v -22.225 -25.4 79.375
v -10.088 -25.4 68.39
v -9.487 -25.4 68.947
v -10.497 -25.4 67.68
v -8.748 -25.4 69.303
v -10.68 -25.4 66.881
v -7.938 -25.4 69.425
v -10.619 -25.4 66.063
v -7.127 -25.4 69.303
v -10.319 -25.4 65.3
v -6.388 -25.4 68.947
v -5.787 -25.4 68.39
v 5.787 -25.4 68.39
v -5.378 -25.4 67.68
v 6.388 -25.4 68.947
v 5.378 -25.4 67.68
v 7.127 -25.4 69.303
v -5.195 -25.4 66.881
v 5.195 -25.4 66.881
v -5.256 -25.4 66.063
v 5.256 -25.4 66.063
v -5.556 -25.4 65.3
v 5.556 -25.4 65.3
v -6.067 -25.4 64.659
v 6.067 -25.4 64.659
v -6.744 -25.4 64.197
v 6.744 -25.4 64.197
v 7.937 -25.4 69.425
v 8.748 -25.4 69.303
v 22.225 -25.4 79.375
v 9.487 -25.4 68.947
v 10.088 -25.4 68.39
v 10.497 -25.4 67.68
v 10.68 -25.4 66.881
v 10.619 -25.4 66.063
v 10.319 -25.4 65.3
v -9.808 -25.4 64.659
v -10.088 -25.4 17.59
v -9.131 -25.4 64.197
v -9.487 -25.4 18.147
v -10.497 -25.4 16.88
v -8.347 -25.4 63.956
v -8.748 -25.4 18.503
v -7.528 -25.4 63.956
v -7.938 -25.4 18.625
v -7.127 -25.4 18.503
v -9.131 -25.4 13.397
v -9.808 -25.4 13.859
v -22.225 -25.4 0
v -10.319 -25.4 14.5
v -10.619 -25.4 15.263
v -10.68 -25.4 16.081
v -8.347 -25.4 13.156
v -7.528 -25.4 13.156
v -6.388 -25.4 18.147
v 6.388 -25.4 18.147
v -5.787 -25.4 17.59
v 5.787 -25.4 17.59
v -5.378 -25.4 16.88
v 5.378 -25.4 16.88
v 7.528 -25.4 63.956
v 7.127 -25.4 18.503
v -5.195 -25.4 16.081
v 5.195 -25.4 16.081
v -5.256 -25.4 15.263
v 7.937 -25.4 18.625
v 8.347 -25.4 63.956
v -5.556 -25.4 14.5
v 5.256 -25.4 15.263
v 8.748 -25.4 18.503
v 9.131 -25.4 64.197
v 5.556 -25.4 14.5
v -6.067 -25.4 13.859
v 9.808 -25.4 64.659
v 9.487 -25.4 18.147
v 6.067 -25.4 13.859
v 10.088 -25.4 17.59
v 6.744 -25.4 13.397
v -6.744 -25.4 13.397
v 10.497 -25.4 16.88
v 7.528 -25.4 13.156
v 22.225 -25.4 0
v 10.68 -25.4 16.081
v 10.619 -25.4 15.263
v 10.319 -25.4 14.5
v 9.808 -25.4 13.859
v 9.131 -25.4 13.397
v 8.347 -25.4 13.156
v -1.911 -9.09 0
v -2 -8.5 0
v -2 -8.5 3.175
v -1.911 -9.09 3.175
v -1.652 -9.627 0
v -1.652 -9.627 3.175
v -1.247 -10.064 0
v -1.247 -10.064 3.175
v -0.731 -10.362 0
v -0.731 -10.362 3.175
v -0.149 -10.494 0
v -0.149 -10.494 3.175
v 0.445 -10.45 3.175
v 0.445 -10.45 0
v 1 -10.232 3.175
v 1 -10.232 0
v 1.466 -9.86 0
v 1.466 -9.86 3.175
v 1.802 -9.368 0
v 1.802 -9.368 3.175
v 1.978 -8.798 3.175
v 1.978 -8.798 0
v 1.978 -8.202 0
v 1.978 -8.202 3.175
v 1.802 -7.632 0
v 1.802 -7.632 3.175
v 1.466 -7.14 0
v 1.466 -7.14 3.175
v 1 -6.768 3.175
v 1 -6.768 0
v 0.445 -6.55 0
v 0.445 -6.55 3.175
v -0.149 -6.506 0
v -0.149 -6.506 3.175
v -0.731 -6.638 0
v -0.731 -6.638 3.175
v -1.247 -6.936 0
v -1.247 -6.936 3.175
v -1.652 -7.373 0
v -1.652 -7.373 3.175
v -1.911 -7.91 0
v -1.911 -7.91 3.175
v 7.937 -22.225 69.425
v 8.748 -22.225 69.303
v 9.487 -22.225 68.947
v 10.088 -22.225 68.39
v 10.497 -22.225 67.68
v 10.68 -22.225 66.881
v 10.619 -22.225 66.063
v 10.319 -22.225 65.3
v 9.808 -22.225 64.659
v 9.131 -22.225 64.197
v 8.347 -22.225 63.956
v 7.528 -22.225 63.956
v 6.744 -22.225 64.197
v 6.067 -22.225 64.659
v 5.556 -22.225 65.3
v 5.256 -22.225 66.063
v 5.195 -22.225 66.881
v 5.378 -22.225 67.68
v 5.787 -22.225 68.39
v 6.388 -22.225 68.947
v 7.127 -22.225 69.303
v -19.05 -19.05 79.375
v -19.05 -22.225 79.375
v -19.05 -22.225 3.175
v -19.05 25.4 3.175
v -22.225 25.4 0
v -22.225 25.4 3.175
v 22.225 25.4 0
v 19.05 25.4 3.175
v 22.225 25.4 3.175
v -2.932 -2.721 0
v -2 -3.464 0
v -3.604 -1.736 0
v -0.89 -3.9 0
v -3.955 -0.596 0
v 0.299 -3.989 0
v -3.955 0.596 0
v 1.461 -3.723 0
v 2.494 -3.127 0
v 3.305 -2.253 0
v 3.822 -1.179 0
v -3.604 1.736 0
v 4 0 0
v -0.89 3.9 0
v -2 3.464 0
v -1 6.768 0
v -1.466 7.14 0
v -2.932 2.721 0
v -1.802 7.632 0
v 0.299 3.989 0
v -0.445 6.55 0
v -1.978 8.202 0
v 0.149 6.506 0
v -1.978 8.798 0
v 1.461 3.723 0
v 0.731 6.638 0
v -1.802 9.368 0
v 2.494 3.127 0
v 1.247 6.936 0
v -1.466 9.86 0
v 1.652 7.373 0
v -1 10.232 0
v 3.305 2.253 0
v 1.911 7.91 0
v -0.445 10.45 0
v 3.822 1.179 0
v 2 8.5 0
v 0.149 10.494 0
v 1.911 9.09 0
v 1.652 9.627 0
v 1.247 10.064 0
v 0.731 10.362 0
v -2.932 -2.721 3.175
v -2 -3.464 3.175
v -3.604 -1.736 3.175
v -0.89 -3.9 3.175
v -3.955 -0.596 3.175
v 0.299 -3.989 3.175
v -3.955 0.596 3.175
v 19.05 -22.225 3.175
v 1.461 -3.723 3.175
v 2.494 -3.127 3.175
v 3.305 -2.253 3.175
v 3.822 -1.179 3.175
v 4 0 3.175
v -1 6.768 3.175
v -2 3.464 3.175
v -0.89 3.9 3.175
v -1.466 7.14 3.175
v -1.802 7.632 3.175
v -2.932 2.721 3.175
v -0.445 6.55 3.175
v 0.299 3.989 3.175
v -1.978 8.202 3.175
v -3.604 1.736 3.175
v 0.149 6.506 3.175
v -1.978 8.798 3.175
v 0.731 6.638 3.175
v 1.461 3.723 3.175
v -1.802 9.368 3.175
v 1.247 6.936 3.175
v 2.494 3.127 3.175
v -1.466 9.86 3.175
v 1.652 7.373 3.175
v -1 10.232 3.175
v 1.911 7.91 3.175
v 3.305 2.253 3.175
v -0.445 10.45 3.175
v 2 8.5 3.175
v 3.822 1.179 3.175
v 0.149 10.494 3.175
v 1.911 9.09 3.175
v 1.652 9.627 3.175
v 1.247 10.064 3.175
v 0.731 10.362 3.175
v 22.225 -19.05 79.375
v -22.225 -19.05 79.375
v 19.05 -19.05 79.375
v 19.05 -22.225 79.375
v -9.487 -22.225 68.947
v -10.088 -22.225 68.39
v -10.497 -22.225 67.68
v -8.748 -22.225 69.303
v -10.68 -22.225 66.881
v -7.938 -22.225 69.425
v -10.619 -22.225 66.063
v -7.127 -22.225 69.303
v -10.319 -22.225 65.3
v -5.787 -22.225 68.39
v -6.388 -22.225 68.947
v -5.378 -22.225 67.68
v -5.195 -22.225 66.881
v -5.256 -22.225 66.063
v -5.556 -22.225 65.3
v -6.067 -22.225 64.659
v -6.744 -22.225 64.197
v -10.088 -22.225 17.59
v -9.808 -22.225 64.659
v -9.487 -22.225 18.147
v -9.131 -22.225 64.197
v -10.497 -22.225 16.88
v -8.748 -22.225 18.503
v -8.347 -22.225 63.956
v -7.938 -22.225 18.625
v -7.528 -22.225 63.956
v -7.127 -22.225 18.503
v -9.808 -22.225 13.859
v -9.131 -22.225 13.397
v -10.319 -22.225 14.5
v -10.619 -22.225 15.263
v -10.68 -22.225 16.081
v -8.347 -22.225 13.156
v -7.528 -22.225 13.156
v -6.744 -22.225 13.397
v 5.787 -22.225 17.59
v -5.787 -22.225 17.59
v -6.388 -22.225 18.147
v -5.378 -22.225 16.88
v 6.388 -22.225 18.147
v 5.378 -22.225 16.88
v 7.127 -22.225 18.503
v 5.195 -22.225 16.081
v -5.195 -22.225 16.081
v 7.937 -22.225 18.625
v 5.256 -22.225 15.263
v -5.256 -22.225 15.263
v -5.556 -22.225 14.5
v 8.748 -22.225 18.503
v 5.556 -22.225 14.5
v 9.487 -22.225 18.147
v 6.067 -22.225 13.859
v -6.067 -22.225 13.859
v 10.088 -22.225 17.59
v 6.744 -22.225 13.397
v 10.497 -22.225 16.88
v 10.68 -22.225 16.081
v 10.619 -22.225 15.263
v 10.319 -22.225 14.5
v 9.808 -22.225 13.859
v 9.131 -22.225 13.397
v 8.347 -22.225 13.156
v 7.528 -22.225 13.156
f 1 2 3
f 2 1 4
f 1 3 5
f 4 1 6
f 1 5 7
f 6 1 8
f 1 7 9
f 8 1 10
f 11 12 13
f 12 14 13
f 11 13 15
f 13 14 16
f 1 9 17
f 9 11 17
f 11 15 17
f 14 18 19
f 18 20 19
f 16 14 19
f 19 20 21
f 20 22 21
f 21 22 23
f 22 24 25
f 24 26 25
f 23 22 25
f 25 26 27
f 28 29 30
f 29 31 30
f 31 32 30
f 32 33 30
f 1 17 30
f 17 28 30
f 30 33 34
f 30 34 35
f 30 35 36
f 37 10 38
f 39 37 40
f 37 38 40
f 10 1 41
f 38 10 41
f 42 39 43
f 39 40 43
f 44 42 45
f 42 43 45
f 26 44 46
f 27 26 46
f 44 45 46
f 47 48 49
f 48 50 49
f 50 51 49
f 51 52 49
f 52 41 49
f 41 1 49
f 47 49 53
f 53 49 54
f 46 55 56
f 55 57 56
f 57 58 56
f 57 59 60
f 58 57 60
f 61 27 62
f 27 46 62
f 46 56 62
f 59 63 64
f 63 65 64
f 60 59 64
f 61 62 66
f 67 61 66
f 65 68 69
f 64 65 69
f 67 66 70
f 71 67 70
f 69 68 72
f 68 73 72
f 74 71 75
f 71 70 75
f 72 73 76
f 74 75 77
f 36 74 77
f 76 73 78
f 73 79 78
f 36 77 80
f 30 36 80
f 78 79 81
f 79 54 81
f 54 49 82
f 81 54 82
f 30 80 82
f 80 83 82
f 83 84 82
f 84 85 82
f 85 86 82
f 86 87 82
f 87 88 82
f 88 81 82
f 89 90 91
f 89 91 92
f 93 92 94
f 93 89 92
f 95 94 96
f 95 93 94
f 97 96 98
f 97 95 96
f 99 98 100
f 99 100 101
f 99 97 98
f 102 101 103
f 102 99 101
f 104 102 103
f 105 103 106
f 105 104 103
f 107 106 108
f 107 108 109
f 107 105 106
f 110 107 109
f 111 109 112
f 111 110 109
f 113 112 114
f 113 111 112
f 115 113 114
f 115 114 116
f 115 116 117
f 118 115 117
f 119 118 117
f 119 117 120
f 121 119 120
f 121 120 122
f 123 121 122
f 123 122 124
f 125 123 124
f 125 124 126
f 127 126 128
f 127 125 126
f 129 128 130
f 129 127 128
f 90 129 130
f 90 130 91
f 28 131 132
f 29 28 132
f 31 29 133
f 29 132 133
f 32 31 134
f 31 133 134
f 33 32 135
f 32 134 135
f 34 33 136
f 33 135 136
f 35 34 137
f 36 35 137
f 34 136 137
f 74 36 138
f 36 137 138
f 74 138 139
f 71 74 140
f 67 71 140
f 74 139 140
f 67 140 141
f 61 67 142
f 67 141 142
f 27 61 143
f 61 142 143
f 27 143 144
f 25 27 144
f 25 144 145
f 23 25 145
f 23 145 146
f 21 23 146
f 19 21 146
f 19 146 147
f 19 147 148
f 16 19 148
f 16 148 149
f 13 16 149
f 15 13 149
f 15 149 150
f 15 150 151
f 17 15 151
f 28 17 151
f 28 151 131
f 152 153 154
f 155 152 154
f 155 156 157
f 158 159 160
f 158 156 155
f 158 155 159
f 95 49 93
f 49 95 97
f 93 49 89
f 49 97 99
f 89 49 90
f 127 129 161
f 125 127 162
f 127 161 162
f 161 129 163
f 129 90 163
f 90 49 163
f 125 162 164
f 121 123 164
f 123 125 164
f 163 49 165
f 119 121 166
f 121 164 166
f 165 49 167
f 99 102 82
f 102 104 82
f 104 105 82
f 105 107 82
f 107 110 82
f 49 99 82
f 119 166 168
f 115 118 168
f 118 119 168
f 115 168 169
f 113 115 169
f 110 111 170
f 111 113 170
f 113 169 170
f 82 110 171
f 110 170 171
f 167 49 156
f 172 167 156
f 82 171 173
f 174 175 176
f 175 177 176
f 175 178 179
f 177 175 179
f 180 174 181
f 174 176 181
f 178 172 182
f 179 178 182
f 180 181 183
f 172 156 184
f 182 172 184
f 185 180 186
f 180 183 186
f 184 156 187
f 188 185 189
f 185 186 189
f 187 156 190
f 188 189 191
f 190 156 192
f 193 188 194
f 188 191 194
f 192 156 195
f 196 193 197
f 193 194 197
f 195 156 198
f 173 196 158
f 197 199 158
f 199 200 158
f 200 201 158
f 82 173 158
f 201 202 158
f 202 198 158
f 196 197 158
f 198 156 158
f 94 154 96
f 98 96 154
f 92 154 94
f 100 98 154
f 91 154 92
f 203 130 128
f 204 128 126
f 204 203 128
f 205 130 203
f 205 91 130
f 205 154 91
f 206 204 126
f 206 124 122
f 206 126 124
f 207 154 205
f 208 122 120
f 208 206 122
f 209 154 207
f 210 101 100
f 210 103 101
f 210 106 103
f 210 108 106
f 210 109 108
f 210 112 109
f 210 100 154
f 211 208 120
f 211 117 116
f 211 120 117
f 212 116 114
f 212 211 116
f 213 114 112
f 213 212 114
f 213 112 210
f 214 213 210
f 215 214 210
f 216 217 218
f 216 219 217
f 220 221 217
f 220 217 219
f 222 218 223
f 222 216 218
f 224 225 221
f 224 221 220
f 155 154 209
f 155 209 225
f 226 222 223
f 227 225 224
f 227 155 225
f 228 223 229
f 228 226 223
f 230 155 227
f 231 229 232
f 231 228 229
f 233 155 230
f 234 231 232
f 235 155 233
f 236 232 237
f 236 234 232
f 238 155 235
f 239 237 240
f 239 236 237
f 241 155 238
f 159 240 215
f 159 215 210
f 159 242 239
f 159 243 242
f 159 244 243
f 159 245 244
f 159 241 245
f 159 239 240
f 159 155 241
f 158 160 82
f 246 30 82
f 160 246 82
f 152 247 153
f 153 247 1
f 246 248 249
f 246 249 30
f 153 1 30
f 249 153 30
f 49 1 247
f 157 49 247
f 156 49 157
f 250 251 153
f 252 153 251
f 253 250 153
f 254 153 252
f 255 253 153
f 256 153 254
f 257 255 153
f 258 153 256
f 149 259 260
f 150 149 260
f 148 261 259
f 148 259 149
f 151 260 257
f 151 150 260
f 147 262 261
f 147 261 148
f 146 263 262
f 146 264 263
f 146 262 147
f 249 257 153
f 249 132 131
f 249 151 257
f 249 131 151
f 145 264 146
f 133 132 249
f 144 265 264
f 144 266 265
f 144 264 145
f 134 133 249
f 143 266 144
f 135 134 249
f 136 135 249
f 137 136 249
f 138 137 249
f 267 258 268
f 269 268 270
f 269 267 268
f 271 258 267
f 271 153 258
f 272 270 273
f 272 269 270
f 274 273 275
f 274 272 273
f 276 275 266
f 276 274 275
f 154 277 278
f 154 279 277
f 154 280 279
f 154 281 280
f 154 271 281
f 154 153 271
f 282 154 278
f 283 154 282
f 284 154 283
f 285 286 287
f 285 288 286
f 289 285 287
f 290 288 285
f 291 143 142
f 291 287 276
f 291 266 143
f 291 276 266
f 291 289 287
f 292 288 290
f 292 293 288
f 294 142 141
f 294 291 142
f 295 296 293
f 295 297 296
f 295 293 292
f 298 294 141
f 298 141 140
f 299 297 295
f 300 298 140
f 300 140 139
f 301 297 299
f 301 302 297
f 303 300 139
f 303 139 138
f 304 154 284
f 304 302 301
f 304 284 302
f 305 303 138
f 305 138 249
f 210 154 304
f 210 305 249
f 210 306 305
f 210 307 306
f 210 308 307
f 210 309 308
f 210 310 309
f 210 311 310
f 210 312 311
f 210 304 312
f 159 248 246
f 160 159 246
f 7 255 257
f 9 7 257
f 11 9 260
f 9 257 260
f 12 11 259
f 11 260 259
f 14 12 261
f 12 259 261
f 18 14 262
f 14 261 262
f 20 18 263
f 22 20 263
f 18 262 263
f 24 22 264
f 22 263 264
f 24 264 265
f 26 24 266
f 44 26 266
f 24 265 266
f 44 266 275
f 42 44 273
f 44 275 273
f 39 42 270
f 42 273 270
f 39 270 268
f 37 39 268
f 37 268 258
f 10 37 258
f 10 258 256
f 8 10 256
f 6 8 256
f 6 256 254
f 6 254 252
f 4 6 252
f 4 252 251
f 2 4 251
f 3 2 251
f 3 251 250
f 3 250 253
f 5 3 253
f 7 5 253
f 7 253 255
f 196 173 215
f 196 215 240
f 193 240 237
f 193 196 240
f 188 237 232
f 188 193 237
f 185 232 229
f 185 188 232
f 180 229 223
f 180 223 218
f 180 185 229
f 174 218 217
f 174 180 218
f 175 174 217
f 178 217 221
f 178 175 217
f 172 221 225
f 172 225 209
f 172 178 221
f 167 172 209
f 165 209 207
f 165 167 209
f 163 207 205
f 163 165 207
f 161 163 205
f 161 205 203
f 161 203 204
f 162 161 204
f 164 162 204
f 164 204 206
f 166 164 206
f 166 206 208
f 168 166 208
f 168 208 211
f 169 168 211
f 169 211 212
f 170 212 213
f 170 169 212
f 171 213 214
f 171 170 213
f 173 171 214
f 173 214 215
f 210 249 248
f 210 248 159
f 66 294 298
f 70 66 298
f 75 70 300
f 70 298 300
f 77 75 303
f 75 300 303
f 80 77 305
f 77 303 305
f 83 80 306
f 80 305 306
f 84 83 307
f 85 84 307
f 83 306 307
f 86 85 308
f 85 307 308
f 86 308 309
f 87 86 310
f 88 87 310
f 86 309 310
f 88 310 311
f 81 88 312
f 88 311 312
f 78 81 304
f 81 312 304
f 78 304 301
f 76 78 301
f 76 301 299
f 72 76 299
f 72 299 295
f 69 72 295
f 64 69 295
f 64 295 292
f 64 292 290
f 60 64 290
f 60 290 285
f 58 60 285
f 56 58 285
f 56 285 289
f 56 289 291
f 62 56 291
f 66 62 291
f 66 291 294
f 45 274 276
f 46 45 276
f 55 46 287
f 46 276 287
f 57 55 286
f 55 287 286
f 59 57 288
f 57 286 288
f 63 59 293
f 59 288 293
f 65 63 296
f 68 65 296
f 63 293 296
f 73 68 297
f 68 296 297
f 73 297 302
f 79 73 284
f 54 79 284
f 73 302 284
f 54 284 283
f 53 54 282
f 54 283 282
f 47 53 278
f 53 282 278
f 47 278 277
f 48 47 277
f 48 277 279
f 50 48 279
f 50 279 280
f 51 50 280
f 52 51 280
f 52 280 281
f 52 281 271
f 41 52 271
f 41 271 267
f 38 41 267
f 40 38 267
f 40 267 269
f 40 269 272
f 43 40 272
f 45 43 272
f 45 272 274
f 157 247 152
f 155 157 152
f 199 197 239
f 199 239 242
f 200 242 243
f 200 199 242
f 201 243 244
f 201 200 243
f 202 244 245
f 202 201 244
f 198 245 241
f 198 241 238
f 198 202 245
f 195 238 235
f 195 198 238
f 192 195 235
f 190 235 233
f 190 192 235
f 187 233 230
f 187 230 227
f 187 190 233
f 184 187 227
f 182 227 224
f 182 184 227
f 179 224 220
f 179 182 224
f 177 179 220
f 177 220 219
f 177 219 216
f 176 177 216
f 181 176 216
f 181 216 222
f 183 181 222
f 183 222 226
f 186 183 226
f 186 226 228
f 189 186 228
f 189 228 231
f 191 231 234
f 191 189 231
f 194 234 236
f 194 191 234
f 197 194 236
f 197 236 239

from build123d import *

# Parameters (mm, degrees)
SKETCH1_W           = 44.45
SKETCH1_H           = 50.8
SKETCH1_R           = 2
SKETCH1_R_2         = 4
BOSS_EXTRUDE1_DEPTH = 3.175
SKETCH3_W           = 44.45
SKETCH3_H           = 3.175
BOSS_EXTRUDE2_DEPTH = 76.2
SKETCH6_W           = 3.175
SKETCH6_H           = 76.2
BOSS_EXTRUDE3_DEPTH = 47.625
CHAMFER1_SIZE       = 44.45
CHAMFER1_SIZE2      = 76.2
SKETCH8_R           = 2.75
CUT_EXTRUDE1_DEPTH  = 96.197068626


with BuildPart() as part:
    # Sketch1 → Boss-Extrude1 (new body)
    with BuildSketch(Plane.XY):
        Rectangle(SKETCH1_W, SKETCH1_H)
        with Locations((0, 8.5)):
            Circle(SKETCH1_R, mode=Mode.SUBTRACT)
        with Locations(Location((0, -8.5, 0), (0, 0, 180))):
            Circle(SKETCH1_R, mode=Mode.SUBTRACT)
        Circle(SKETCH1_R_2, mode=Mode.SUBTRACT)
    extrude(amount=BOSS_EXTRUDE1_DEPTH)

    # Sketch3 → Boss-Extrude2 (add)
    with BuildSketch(Plane.XY.offset(3.175)):
        with Locations((0, -23.8125)):
            Rectangle(SKETCH3_W, SKETCH3_H)
    extrude(amount=BOSS_EXTRUDE2_DEPTH)

    # Sketch6 → Boss-Extrude3 (add)
    with BuildSketch(Plane(origin=(0, -22.225, 0), x_dir=(1, 0, 0), z_dir=(0, 1, 0))):
        with Locations((20.6375, -41.275)):
            Rectangle(SKETCH6_W, SKETCH6_H)
        with Locations((-20.6375, -41.275)):
            Rectangle(SKETCH6_W, SKETCH6_H)
    extrude(amount=BOSS_EXTRUDE3_DEPTH)

    # Chamfer1
    chamfer1_edges = [part.edges().sort_by_distance(p)[0] for p in [
        (-20.6375, 25.4, 79.375),
        (20.6375, 25.4, 79.375),
    ]]
    chamfer1_side = [part.faces().sort_by_distance(p)[0] for p in [
        (0, -24.724985741, 79.375),
    ]]
    chamfer(chamfer1_edges, length=CHAMFER1_SIZE, length2=CHAMFER1_SIZE2, reference=chamfer1_side[0])

    # Sketch8 → Cut-Extrude1 (cut, through all)
    with BuildSketch(Plane(origin=(0, -22.225, 0), x_dir=(1, 0, 0), z_dir=(0, 1, 0))):
        with Locations(Location((-7.9375, -15.875, 0), (0, 0, 270))):
            Circle(SKETCH8_R)
        with Locations(Location((7.9375, -15.875, 0), (0, 0, 270))):
            Circle(SKETCH8_R)
        with Locations(Location((7.9375, -66.675, 0), (0, 0, 270))):
            Circle(SKETCH8_R)
        with Locations(Location((-7.9375, -66.675, 0), (0, 0, 270))):
            Circle(SKETCH8_R)
    extrude(amount=-CUT_EXTRUDE1_DEPTH, mode=Mode.SUBTRACT)


solid = part.part
